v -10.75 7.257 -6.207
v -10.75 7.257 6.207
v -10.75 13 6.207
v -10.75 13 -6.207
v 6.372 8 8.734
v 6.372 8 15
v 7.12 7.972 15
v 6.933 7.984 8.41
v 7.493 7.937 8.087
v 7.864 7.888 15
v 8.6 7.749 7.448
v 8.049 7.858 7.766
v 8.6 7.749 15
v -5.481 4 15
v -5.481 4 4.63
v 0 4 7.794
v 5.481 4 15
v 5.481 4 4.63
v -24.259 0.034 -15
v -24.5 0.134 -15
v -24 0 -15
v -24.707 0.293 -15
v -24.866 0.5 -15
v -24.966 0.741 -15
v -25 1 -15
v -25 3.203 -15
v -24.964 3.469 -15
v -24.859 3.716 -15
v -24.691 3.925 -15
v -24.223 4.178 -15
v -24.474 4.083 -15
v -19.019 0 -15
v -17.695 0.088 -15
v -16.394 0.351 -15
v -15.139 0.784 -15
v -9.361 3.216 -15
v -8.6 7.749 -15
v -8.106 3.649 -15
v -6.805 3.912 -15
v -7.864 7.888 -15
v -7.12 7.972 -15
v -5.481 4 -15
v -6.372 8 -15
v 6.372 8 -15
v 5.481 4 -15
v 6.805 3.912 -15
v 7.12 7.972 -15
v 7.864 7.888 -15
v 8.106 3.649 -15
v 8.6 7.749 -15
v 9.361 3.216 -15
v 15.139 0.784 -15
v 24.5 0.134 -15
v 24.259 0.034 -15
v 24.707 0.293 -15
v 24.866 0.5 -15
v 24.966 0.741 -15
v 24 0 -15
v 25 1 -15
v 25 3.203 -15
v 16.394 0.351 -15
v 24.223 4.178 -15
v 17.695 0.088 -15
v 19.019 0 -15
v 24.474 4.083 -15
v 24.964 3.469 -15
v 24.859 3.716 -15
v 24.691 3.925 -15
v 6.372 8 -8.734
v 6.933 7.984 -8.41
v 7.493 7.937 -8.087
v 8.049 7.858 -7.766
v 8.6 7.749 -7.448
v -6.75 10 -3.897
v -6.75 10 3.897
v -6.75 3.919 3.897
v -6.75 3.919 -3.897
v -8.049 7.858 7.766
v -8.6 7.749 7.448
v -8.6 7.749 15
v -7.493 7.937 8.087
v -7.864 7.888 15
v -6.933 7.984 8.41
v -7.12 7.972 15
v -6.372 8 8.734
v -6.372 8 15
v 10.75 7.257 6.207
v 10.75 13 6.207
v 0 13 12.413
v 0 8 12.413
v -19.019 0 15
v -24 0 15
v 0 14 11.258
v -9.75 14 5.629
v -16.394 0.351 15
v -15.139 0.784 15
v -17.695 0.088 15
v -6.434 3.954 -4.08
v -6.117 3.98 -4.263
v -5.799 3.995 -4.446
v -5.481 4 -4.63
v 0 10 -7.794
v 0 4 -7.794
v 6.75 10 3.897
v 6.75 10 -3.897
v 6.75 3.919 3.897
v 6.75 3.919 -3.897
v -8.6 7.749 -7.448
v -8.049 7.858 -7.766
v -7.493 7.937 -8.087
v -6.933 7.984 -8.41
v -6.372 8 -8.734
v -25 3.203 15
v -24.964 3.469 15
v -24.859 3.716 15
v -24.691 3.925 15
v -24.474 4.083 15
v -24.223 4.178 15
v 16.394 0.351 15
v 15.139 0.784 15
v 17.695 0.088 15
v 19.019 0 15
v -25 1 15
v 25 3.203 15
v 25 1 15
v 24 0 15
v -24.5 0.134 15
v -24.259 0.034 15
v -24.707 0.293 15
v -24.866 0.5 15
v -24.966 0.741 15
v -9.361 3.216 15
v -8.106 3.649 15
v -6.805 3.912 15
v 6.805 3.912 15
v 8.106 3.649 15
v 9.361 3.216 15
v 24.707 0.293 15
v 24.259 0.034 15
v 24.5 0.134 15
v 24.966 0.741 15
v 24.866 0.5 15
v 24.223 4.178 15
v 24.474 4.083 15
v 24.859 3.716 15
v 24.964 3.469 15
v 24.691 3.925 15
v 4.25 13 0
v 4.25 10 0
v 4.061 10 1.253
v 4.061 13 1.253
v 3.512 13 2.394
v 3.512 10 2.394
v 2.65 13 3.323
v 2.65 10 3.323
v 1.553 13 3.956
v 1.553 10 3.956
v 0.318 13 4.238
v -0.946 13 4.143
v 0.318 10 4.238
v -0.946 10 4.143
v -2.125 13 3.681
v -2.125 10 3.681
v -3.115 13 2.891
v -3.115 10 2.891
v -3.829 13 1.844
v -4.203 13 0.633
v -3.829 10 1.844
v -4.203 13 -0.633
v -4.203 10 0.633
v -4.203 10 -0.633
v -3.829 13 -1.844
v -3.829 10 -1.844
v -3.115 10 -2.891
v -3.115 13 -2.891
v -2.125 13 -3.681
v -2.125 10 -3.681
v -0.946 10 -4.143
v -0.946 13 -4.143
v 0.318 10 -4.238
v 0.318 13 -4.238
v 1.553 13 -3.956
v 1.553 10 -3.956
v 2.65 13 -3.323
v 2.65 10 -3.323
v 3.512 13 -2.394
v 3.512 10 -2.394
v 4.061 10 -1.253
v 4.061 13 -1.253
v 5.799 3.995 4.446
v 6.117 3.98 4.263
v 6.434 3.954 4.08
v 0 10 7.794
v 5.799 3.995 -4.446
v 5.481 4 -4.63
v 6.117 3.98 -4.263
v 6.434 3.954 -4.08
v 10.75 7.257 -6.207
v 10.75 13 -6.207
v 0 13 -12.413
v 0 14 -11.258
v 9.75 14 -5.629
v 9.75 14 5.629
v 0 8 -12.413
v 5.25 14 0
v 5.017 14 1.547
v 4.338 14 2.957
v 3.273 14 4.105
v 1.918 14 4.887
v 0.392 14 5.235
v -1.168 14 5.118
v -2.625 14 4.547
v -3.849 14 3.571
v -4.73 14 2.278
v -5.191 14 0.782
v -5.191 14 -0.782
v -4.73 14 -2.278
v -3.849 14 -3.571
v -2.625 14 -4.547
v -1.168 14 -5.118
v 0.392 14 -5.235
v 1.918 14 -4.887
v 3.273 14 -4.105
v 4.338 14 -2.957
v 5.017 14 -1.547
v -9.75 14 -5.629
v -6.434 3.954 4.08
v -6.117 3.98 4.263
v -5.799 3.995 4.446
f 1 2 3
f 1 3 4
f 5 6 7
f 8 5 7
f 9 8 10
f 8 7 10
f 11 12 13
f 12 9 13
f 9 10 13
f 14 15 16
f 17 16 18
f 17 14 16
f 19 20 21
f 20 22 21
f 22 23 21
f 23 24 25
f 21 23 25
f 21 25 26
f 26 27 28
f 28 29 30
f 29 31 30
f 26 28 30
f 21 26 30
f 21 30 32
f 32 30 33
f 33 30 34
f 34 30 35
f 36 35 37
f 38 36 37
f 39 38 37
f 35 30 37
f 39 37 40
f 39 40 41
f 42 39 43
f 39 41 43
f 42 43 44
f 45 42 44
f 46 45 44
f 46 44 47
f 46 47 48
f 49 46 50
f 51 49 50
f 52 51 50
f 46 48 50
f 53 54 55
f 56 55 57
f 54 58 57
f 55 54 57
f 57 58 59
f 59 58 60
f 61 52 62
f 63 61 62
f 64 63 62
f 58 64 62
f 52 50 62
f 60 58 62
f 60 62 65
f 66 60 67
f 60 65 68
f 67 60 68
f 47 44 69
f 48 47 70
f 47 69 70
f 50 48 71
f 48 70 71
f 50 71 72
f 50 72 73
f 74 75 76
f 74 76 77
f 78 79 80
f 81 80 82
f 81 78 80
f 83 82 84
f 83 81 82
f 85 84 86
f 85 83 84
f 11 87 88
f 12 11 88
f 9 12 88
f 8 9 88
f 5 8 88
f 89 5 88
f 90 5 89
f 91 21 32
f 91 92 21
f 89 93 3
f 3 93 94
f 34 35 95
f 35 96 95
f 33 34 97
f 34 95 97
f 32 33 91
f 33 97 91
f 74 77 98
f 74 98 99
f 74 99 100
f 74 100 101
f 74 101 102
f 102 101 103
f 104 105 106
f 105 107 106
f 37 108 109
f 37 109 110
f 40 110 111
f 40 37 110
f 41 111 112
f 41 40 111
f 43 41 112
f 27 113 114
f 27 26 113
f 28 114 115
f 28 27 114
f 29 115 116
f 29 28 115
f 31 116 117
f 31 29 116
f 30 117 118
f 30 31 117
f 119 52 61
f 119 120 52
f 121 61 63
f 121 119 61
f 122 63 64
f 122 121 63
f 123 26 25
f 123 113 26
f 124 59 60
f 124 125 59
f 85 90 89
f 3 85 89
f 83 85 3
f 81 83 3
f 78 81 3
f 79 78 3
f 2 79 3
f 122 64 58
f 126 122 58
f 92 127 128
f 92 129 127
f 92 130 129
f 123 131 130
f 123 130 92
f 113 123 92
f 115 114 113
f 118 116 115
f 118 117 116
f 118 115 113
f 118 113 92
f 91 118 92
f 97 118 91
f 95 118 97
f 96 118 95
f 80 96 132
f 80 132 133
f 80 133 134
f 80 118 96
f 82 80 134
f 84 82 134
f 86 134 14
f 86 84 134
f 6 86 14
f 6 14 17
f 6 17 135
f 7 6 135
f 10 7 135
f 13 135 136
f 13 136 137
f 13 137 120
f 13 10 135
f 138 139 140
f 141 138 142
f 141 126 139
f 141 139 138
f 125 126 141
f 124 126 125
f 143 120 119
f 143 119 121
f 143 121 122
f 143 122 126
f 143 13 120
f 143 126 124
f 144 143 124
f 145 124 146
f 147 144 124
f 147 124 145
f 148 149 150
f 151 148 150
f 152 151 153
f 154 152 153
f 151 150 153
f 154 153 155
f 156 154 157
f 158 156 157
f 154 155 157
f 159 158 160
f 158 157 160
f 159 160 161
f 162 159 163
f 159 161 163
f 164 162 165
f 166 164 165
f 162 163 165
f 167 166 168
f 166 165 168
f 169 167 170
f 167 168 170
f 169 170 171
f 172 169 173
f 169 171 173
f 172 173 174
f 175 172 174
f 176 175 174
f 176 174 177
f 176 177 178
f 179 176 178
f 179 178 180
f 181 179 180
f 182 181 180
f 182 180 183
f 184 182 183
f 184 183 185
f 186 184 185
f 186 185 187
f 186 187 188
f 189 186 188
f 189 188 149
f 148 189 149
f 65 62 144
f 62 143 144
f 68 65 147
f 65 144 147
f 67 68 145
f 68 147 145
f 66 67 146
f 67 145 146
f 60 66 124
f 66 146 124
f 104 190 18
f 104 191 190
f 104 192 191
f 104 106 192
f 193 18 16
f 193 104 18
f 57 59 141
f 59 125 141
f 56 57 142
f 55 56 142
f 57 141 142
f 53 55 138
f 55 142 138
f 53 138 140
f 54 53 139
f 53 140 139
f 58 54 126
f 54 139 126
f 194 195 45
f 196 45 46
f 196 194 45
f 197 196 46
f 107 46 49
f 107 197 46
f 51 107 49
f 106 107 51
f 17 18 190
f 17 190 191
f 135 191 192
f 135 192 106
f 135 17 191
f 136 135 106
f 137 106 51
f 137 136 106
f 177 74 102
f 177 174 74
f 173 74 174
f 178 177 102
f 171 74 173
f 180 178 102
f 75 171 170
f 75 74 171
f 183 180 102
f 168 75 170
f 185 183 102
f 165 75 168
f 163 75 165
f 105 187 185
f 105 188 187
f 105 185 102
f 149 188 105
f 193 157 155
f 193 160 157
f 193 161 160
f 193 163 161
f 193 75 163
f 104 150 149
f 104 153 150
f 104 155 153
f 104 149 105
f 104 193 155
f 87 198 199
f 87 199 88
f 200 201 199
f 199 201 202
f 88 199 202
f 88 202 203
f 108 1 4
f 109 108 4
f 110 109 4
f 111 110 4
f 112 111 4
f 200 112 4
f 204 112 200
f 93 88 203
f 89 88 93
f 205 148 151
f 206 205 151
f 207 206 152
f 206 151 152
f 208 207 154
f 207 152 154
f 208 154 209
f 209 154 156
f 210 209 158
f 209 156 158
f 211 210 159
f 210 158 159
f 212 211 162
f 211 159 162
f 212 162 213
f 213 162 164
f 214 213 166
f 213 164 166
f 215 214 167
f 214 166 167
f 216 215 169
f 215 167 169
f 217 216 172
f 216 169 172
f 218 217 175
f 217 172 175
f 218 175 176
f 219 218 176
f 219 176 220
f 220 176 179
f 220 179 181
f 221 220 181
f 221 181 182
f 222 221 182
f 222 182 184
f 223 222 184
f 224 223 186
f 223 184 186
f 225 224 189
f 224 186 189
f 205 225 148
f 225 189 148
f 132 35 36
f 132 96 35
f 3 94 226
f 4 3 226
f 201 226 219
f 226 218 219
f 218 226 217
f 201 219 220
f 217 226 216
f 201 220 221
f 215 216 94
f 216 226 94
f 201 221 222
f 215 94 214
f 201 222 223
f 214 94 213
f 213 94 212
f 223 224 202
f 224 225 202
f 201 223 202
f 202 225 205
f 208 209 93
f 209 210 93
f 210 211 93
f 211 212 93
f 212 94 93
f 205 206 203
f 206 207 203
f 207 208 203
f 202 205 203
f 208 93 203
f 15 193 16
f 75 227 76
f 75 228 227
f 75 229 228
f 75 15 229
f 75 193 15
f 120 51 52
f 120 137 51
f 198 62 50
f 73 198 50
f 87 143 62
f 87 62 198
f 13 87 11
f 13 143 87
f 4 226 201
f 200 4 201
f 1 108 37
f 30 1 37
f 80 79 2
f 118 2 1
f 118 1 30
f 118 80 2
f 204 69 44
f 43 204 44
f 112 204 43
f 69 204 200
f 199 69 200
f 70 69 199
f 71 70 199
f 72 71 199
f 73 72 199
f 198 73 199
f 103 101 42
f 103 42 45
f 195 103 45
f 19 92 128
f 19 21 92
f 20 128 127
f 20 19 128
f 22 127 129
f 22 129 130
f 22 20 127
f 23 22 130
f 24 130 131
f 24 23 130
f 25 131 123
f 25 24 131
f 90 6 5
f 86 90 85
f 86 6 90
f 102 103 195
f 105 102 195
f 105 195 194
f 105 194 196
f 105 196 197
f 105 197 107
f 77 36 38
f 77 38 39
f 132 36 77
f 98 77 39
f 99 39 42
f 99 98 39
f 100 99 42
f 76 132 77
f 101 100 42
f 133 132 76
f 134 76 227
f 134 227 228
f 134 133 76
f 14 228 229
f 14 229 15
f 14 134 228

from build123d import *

# Parameters (mm, degrees)
PAD_DEPTH            = 15
SKETCH001_R          = 4.25
HOLE_DEPTH           = 25
CHAMFER_SIZE         = 1
FILLET_R             = 10
FILLET001_R          = 1
FILLET002_R          = 10
PAD003_DEPTH         = 10
SKETCH010_R          = 4.25
HOLE005_DEPTH        = 25
POCKET002_DEPTH      = 6
POCKET002_DEPTH_BACK = 15
CHAMFER003_SIZE      = 1


with BuildPart() as part:
    # Sketch → Pad (new body, symmetric)
    with BuildSketch(Plane.XY):
        Polygon((-25, 0), (-17, 0), (-7.5, 4), (7.5, 4), (17, 0), (25, 0), (25, 4), (7.5, 8), (-7.5, 8), (-25, 4), align=None)
    extrude(amount=PAD_DEPTH, both=True)

    # Sketch001 → Hole (cut)
    with BuildSketch(Plane.XZ):
        Circle(SKETCH001_R)
    extrude(amount=-HOLE_DEPTH, mode=Mode.SUBTRACT)

    # Chamfer
    chamfer_edges = [part.edges().sort_by_distance(p)[0] for p in [
        (4.25, 4, 0),
        (4.25, 8, 0),
    ]]
    chamfer(chamfer_edges, length=CHAMFER_SIZE)

    # Fillet
    fillet_edges = [part.edges().sort_by_distance(p)[0] for p in [
        (-17, 0, 0),
        (17, 0, 0),
    ]]
    fillet(fillet_edges, radius=FILLET_R)

    # Fillet001
    fillet001_edges = [part.edges().sort_by_distance(p)[0] for p in [
        (25, 0, 0),
        (25, 4, 0),
        (-25, 0, 0),
        (-25, 4, 0),
    ]]
    fillet(fillet001_edges, radius=FILLET001_R)

    # Fillet002
    fillet002_edges = [part.edges().sort_by_distance(p)[0] for p in [
        (-7.5, 4, 0),
        (7.5, 4, 0),
        (7.5, 8, 0),
        (-7.5, 8, 0),
    ]]
    fillet(fillet002_edges, radius=FILLET002_R)

    # Sketch009 (on Face5 of Clone) → Pad003 (new body)
    with BuildSketch(Plane.XZ.offset(-4)):
        Polygon((10.75, -6.206515), (10.75, 6.206515), (0, 12.413031), (-10.75, 6.206515), (-10.75, -6.206515), (0, -12.413031), align=None)
    extrude(amount=-PAD003_DEPTH)

    # Sketch010 (on Face34 of Pad003) → Hole005 (cut)
    with BuildSketch(Plane.XZ.offset(-4)):
        Circle(SKETCH010_R)
    extrude(amount=-HOLE005_DEPTH, mode=Mode.SUBTRACT)

    # Sketch011 (on Face23 of Hole005) → Pocket002 (cut, two sides)
    with BuildSketch(Plane.XZ.offset(-4)) as pocket002_sk:
        Polygon((6.75, -3.897114), (6.75, 3.897114), (0, 7.794229), (-6.75, 3.897114), (-6.75, -3.897114), (0, -7.794229), align=None)
    extrude(amount=-POCKET002_DEPTH, mode=Mode.SUBTRACT)
    extrude(pocket002_sk.sketch, amount=POCKET002_DEPTH_BACK, mode=Mode.SUBTRACT)

    # Chamfer003
    chamfer003_edges = [part.edges().sort_by_distance(p)[0] for p in [
        (10.75, 14, 0),
        (5.375, 14, -9.309773),
        (5.375, 14, 9.309773),
        (-5.375, 14, -9.309773),
        (-5.375, 14, 9.309773),
        (-10.75, 14, 0),
        (4.25, 14, 0),
    ]]
    chamfer(chamfer003_edges, length=CHAMFER003_SIZE)


solid = part.part
